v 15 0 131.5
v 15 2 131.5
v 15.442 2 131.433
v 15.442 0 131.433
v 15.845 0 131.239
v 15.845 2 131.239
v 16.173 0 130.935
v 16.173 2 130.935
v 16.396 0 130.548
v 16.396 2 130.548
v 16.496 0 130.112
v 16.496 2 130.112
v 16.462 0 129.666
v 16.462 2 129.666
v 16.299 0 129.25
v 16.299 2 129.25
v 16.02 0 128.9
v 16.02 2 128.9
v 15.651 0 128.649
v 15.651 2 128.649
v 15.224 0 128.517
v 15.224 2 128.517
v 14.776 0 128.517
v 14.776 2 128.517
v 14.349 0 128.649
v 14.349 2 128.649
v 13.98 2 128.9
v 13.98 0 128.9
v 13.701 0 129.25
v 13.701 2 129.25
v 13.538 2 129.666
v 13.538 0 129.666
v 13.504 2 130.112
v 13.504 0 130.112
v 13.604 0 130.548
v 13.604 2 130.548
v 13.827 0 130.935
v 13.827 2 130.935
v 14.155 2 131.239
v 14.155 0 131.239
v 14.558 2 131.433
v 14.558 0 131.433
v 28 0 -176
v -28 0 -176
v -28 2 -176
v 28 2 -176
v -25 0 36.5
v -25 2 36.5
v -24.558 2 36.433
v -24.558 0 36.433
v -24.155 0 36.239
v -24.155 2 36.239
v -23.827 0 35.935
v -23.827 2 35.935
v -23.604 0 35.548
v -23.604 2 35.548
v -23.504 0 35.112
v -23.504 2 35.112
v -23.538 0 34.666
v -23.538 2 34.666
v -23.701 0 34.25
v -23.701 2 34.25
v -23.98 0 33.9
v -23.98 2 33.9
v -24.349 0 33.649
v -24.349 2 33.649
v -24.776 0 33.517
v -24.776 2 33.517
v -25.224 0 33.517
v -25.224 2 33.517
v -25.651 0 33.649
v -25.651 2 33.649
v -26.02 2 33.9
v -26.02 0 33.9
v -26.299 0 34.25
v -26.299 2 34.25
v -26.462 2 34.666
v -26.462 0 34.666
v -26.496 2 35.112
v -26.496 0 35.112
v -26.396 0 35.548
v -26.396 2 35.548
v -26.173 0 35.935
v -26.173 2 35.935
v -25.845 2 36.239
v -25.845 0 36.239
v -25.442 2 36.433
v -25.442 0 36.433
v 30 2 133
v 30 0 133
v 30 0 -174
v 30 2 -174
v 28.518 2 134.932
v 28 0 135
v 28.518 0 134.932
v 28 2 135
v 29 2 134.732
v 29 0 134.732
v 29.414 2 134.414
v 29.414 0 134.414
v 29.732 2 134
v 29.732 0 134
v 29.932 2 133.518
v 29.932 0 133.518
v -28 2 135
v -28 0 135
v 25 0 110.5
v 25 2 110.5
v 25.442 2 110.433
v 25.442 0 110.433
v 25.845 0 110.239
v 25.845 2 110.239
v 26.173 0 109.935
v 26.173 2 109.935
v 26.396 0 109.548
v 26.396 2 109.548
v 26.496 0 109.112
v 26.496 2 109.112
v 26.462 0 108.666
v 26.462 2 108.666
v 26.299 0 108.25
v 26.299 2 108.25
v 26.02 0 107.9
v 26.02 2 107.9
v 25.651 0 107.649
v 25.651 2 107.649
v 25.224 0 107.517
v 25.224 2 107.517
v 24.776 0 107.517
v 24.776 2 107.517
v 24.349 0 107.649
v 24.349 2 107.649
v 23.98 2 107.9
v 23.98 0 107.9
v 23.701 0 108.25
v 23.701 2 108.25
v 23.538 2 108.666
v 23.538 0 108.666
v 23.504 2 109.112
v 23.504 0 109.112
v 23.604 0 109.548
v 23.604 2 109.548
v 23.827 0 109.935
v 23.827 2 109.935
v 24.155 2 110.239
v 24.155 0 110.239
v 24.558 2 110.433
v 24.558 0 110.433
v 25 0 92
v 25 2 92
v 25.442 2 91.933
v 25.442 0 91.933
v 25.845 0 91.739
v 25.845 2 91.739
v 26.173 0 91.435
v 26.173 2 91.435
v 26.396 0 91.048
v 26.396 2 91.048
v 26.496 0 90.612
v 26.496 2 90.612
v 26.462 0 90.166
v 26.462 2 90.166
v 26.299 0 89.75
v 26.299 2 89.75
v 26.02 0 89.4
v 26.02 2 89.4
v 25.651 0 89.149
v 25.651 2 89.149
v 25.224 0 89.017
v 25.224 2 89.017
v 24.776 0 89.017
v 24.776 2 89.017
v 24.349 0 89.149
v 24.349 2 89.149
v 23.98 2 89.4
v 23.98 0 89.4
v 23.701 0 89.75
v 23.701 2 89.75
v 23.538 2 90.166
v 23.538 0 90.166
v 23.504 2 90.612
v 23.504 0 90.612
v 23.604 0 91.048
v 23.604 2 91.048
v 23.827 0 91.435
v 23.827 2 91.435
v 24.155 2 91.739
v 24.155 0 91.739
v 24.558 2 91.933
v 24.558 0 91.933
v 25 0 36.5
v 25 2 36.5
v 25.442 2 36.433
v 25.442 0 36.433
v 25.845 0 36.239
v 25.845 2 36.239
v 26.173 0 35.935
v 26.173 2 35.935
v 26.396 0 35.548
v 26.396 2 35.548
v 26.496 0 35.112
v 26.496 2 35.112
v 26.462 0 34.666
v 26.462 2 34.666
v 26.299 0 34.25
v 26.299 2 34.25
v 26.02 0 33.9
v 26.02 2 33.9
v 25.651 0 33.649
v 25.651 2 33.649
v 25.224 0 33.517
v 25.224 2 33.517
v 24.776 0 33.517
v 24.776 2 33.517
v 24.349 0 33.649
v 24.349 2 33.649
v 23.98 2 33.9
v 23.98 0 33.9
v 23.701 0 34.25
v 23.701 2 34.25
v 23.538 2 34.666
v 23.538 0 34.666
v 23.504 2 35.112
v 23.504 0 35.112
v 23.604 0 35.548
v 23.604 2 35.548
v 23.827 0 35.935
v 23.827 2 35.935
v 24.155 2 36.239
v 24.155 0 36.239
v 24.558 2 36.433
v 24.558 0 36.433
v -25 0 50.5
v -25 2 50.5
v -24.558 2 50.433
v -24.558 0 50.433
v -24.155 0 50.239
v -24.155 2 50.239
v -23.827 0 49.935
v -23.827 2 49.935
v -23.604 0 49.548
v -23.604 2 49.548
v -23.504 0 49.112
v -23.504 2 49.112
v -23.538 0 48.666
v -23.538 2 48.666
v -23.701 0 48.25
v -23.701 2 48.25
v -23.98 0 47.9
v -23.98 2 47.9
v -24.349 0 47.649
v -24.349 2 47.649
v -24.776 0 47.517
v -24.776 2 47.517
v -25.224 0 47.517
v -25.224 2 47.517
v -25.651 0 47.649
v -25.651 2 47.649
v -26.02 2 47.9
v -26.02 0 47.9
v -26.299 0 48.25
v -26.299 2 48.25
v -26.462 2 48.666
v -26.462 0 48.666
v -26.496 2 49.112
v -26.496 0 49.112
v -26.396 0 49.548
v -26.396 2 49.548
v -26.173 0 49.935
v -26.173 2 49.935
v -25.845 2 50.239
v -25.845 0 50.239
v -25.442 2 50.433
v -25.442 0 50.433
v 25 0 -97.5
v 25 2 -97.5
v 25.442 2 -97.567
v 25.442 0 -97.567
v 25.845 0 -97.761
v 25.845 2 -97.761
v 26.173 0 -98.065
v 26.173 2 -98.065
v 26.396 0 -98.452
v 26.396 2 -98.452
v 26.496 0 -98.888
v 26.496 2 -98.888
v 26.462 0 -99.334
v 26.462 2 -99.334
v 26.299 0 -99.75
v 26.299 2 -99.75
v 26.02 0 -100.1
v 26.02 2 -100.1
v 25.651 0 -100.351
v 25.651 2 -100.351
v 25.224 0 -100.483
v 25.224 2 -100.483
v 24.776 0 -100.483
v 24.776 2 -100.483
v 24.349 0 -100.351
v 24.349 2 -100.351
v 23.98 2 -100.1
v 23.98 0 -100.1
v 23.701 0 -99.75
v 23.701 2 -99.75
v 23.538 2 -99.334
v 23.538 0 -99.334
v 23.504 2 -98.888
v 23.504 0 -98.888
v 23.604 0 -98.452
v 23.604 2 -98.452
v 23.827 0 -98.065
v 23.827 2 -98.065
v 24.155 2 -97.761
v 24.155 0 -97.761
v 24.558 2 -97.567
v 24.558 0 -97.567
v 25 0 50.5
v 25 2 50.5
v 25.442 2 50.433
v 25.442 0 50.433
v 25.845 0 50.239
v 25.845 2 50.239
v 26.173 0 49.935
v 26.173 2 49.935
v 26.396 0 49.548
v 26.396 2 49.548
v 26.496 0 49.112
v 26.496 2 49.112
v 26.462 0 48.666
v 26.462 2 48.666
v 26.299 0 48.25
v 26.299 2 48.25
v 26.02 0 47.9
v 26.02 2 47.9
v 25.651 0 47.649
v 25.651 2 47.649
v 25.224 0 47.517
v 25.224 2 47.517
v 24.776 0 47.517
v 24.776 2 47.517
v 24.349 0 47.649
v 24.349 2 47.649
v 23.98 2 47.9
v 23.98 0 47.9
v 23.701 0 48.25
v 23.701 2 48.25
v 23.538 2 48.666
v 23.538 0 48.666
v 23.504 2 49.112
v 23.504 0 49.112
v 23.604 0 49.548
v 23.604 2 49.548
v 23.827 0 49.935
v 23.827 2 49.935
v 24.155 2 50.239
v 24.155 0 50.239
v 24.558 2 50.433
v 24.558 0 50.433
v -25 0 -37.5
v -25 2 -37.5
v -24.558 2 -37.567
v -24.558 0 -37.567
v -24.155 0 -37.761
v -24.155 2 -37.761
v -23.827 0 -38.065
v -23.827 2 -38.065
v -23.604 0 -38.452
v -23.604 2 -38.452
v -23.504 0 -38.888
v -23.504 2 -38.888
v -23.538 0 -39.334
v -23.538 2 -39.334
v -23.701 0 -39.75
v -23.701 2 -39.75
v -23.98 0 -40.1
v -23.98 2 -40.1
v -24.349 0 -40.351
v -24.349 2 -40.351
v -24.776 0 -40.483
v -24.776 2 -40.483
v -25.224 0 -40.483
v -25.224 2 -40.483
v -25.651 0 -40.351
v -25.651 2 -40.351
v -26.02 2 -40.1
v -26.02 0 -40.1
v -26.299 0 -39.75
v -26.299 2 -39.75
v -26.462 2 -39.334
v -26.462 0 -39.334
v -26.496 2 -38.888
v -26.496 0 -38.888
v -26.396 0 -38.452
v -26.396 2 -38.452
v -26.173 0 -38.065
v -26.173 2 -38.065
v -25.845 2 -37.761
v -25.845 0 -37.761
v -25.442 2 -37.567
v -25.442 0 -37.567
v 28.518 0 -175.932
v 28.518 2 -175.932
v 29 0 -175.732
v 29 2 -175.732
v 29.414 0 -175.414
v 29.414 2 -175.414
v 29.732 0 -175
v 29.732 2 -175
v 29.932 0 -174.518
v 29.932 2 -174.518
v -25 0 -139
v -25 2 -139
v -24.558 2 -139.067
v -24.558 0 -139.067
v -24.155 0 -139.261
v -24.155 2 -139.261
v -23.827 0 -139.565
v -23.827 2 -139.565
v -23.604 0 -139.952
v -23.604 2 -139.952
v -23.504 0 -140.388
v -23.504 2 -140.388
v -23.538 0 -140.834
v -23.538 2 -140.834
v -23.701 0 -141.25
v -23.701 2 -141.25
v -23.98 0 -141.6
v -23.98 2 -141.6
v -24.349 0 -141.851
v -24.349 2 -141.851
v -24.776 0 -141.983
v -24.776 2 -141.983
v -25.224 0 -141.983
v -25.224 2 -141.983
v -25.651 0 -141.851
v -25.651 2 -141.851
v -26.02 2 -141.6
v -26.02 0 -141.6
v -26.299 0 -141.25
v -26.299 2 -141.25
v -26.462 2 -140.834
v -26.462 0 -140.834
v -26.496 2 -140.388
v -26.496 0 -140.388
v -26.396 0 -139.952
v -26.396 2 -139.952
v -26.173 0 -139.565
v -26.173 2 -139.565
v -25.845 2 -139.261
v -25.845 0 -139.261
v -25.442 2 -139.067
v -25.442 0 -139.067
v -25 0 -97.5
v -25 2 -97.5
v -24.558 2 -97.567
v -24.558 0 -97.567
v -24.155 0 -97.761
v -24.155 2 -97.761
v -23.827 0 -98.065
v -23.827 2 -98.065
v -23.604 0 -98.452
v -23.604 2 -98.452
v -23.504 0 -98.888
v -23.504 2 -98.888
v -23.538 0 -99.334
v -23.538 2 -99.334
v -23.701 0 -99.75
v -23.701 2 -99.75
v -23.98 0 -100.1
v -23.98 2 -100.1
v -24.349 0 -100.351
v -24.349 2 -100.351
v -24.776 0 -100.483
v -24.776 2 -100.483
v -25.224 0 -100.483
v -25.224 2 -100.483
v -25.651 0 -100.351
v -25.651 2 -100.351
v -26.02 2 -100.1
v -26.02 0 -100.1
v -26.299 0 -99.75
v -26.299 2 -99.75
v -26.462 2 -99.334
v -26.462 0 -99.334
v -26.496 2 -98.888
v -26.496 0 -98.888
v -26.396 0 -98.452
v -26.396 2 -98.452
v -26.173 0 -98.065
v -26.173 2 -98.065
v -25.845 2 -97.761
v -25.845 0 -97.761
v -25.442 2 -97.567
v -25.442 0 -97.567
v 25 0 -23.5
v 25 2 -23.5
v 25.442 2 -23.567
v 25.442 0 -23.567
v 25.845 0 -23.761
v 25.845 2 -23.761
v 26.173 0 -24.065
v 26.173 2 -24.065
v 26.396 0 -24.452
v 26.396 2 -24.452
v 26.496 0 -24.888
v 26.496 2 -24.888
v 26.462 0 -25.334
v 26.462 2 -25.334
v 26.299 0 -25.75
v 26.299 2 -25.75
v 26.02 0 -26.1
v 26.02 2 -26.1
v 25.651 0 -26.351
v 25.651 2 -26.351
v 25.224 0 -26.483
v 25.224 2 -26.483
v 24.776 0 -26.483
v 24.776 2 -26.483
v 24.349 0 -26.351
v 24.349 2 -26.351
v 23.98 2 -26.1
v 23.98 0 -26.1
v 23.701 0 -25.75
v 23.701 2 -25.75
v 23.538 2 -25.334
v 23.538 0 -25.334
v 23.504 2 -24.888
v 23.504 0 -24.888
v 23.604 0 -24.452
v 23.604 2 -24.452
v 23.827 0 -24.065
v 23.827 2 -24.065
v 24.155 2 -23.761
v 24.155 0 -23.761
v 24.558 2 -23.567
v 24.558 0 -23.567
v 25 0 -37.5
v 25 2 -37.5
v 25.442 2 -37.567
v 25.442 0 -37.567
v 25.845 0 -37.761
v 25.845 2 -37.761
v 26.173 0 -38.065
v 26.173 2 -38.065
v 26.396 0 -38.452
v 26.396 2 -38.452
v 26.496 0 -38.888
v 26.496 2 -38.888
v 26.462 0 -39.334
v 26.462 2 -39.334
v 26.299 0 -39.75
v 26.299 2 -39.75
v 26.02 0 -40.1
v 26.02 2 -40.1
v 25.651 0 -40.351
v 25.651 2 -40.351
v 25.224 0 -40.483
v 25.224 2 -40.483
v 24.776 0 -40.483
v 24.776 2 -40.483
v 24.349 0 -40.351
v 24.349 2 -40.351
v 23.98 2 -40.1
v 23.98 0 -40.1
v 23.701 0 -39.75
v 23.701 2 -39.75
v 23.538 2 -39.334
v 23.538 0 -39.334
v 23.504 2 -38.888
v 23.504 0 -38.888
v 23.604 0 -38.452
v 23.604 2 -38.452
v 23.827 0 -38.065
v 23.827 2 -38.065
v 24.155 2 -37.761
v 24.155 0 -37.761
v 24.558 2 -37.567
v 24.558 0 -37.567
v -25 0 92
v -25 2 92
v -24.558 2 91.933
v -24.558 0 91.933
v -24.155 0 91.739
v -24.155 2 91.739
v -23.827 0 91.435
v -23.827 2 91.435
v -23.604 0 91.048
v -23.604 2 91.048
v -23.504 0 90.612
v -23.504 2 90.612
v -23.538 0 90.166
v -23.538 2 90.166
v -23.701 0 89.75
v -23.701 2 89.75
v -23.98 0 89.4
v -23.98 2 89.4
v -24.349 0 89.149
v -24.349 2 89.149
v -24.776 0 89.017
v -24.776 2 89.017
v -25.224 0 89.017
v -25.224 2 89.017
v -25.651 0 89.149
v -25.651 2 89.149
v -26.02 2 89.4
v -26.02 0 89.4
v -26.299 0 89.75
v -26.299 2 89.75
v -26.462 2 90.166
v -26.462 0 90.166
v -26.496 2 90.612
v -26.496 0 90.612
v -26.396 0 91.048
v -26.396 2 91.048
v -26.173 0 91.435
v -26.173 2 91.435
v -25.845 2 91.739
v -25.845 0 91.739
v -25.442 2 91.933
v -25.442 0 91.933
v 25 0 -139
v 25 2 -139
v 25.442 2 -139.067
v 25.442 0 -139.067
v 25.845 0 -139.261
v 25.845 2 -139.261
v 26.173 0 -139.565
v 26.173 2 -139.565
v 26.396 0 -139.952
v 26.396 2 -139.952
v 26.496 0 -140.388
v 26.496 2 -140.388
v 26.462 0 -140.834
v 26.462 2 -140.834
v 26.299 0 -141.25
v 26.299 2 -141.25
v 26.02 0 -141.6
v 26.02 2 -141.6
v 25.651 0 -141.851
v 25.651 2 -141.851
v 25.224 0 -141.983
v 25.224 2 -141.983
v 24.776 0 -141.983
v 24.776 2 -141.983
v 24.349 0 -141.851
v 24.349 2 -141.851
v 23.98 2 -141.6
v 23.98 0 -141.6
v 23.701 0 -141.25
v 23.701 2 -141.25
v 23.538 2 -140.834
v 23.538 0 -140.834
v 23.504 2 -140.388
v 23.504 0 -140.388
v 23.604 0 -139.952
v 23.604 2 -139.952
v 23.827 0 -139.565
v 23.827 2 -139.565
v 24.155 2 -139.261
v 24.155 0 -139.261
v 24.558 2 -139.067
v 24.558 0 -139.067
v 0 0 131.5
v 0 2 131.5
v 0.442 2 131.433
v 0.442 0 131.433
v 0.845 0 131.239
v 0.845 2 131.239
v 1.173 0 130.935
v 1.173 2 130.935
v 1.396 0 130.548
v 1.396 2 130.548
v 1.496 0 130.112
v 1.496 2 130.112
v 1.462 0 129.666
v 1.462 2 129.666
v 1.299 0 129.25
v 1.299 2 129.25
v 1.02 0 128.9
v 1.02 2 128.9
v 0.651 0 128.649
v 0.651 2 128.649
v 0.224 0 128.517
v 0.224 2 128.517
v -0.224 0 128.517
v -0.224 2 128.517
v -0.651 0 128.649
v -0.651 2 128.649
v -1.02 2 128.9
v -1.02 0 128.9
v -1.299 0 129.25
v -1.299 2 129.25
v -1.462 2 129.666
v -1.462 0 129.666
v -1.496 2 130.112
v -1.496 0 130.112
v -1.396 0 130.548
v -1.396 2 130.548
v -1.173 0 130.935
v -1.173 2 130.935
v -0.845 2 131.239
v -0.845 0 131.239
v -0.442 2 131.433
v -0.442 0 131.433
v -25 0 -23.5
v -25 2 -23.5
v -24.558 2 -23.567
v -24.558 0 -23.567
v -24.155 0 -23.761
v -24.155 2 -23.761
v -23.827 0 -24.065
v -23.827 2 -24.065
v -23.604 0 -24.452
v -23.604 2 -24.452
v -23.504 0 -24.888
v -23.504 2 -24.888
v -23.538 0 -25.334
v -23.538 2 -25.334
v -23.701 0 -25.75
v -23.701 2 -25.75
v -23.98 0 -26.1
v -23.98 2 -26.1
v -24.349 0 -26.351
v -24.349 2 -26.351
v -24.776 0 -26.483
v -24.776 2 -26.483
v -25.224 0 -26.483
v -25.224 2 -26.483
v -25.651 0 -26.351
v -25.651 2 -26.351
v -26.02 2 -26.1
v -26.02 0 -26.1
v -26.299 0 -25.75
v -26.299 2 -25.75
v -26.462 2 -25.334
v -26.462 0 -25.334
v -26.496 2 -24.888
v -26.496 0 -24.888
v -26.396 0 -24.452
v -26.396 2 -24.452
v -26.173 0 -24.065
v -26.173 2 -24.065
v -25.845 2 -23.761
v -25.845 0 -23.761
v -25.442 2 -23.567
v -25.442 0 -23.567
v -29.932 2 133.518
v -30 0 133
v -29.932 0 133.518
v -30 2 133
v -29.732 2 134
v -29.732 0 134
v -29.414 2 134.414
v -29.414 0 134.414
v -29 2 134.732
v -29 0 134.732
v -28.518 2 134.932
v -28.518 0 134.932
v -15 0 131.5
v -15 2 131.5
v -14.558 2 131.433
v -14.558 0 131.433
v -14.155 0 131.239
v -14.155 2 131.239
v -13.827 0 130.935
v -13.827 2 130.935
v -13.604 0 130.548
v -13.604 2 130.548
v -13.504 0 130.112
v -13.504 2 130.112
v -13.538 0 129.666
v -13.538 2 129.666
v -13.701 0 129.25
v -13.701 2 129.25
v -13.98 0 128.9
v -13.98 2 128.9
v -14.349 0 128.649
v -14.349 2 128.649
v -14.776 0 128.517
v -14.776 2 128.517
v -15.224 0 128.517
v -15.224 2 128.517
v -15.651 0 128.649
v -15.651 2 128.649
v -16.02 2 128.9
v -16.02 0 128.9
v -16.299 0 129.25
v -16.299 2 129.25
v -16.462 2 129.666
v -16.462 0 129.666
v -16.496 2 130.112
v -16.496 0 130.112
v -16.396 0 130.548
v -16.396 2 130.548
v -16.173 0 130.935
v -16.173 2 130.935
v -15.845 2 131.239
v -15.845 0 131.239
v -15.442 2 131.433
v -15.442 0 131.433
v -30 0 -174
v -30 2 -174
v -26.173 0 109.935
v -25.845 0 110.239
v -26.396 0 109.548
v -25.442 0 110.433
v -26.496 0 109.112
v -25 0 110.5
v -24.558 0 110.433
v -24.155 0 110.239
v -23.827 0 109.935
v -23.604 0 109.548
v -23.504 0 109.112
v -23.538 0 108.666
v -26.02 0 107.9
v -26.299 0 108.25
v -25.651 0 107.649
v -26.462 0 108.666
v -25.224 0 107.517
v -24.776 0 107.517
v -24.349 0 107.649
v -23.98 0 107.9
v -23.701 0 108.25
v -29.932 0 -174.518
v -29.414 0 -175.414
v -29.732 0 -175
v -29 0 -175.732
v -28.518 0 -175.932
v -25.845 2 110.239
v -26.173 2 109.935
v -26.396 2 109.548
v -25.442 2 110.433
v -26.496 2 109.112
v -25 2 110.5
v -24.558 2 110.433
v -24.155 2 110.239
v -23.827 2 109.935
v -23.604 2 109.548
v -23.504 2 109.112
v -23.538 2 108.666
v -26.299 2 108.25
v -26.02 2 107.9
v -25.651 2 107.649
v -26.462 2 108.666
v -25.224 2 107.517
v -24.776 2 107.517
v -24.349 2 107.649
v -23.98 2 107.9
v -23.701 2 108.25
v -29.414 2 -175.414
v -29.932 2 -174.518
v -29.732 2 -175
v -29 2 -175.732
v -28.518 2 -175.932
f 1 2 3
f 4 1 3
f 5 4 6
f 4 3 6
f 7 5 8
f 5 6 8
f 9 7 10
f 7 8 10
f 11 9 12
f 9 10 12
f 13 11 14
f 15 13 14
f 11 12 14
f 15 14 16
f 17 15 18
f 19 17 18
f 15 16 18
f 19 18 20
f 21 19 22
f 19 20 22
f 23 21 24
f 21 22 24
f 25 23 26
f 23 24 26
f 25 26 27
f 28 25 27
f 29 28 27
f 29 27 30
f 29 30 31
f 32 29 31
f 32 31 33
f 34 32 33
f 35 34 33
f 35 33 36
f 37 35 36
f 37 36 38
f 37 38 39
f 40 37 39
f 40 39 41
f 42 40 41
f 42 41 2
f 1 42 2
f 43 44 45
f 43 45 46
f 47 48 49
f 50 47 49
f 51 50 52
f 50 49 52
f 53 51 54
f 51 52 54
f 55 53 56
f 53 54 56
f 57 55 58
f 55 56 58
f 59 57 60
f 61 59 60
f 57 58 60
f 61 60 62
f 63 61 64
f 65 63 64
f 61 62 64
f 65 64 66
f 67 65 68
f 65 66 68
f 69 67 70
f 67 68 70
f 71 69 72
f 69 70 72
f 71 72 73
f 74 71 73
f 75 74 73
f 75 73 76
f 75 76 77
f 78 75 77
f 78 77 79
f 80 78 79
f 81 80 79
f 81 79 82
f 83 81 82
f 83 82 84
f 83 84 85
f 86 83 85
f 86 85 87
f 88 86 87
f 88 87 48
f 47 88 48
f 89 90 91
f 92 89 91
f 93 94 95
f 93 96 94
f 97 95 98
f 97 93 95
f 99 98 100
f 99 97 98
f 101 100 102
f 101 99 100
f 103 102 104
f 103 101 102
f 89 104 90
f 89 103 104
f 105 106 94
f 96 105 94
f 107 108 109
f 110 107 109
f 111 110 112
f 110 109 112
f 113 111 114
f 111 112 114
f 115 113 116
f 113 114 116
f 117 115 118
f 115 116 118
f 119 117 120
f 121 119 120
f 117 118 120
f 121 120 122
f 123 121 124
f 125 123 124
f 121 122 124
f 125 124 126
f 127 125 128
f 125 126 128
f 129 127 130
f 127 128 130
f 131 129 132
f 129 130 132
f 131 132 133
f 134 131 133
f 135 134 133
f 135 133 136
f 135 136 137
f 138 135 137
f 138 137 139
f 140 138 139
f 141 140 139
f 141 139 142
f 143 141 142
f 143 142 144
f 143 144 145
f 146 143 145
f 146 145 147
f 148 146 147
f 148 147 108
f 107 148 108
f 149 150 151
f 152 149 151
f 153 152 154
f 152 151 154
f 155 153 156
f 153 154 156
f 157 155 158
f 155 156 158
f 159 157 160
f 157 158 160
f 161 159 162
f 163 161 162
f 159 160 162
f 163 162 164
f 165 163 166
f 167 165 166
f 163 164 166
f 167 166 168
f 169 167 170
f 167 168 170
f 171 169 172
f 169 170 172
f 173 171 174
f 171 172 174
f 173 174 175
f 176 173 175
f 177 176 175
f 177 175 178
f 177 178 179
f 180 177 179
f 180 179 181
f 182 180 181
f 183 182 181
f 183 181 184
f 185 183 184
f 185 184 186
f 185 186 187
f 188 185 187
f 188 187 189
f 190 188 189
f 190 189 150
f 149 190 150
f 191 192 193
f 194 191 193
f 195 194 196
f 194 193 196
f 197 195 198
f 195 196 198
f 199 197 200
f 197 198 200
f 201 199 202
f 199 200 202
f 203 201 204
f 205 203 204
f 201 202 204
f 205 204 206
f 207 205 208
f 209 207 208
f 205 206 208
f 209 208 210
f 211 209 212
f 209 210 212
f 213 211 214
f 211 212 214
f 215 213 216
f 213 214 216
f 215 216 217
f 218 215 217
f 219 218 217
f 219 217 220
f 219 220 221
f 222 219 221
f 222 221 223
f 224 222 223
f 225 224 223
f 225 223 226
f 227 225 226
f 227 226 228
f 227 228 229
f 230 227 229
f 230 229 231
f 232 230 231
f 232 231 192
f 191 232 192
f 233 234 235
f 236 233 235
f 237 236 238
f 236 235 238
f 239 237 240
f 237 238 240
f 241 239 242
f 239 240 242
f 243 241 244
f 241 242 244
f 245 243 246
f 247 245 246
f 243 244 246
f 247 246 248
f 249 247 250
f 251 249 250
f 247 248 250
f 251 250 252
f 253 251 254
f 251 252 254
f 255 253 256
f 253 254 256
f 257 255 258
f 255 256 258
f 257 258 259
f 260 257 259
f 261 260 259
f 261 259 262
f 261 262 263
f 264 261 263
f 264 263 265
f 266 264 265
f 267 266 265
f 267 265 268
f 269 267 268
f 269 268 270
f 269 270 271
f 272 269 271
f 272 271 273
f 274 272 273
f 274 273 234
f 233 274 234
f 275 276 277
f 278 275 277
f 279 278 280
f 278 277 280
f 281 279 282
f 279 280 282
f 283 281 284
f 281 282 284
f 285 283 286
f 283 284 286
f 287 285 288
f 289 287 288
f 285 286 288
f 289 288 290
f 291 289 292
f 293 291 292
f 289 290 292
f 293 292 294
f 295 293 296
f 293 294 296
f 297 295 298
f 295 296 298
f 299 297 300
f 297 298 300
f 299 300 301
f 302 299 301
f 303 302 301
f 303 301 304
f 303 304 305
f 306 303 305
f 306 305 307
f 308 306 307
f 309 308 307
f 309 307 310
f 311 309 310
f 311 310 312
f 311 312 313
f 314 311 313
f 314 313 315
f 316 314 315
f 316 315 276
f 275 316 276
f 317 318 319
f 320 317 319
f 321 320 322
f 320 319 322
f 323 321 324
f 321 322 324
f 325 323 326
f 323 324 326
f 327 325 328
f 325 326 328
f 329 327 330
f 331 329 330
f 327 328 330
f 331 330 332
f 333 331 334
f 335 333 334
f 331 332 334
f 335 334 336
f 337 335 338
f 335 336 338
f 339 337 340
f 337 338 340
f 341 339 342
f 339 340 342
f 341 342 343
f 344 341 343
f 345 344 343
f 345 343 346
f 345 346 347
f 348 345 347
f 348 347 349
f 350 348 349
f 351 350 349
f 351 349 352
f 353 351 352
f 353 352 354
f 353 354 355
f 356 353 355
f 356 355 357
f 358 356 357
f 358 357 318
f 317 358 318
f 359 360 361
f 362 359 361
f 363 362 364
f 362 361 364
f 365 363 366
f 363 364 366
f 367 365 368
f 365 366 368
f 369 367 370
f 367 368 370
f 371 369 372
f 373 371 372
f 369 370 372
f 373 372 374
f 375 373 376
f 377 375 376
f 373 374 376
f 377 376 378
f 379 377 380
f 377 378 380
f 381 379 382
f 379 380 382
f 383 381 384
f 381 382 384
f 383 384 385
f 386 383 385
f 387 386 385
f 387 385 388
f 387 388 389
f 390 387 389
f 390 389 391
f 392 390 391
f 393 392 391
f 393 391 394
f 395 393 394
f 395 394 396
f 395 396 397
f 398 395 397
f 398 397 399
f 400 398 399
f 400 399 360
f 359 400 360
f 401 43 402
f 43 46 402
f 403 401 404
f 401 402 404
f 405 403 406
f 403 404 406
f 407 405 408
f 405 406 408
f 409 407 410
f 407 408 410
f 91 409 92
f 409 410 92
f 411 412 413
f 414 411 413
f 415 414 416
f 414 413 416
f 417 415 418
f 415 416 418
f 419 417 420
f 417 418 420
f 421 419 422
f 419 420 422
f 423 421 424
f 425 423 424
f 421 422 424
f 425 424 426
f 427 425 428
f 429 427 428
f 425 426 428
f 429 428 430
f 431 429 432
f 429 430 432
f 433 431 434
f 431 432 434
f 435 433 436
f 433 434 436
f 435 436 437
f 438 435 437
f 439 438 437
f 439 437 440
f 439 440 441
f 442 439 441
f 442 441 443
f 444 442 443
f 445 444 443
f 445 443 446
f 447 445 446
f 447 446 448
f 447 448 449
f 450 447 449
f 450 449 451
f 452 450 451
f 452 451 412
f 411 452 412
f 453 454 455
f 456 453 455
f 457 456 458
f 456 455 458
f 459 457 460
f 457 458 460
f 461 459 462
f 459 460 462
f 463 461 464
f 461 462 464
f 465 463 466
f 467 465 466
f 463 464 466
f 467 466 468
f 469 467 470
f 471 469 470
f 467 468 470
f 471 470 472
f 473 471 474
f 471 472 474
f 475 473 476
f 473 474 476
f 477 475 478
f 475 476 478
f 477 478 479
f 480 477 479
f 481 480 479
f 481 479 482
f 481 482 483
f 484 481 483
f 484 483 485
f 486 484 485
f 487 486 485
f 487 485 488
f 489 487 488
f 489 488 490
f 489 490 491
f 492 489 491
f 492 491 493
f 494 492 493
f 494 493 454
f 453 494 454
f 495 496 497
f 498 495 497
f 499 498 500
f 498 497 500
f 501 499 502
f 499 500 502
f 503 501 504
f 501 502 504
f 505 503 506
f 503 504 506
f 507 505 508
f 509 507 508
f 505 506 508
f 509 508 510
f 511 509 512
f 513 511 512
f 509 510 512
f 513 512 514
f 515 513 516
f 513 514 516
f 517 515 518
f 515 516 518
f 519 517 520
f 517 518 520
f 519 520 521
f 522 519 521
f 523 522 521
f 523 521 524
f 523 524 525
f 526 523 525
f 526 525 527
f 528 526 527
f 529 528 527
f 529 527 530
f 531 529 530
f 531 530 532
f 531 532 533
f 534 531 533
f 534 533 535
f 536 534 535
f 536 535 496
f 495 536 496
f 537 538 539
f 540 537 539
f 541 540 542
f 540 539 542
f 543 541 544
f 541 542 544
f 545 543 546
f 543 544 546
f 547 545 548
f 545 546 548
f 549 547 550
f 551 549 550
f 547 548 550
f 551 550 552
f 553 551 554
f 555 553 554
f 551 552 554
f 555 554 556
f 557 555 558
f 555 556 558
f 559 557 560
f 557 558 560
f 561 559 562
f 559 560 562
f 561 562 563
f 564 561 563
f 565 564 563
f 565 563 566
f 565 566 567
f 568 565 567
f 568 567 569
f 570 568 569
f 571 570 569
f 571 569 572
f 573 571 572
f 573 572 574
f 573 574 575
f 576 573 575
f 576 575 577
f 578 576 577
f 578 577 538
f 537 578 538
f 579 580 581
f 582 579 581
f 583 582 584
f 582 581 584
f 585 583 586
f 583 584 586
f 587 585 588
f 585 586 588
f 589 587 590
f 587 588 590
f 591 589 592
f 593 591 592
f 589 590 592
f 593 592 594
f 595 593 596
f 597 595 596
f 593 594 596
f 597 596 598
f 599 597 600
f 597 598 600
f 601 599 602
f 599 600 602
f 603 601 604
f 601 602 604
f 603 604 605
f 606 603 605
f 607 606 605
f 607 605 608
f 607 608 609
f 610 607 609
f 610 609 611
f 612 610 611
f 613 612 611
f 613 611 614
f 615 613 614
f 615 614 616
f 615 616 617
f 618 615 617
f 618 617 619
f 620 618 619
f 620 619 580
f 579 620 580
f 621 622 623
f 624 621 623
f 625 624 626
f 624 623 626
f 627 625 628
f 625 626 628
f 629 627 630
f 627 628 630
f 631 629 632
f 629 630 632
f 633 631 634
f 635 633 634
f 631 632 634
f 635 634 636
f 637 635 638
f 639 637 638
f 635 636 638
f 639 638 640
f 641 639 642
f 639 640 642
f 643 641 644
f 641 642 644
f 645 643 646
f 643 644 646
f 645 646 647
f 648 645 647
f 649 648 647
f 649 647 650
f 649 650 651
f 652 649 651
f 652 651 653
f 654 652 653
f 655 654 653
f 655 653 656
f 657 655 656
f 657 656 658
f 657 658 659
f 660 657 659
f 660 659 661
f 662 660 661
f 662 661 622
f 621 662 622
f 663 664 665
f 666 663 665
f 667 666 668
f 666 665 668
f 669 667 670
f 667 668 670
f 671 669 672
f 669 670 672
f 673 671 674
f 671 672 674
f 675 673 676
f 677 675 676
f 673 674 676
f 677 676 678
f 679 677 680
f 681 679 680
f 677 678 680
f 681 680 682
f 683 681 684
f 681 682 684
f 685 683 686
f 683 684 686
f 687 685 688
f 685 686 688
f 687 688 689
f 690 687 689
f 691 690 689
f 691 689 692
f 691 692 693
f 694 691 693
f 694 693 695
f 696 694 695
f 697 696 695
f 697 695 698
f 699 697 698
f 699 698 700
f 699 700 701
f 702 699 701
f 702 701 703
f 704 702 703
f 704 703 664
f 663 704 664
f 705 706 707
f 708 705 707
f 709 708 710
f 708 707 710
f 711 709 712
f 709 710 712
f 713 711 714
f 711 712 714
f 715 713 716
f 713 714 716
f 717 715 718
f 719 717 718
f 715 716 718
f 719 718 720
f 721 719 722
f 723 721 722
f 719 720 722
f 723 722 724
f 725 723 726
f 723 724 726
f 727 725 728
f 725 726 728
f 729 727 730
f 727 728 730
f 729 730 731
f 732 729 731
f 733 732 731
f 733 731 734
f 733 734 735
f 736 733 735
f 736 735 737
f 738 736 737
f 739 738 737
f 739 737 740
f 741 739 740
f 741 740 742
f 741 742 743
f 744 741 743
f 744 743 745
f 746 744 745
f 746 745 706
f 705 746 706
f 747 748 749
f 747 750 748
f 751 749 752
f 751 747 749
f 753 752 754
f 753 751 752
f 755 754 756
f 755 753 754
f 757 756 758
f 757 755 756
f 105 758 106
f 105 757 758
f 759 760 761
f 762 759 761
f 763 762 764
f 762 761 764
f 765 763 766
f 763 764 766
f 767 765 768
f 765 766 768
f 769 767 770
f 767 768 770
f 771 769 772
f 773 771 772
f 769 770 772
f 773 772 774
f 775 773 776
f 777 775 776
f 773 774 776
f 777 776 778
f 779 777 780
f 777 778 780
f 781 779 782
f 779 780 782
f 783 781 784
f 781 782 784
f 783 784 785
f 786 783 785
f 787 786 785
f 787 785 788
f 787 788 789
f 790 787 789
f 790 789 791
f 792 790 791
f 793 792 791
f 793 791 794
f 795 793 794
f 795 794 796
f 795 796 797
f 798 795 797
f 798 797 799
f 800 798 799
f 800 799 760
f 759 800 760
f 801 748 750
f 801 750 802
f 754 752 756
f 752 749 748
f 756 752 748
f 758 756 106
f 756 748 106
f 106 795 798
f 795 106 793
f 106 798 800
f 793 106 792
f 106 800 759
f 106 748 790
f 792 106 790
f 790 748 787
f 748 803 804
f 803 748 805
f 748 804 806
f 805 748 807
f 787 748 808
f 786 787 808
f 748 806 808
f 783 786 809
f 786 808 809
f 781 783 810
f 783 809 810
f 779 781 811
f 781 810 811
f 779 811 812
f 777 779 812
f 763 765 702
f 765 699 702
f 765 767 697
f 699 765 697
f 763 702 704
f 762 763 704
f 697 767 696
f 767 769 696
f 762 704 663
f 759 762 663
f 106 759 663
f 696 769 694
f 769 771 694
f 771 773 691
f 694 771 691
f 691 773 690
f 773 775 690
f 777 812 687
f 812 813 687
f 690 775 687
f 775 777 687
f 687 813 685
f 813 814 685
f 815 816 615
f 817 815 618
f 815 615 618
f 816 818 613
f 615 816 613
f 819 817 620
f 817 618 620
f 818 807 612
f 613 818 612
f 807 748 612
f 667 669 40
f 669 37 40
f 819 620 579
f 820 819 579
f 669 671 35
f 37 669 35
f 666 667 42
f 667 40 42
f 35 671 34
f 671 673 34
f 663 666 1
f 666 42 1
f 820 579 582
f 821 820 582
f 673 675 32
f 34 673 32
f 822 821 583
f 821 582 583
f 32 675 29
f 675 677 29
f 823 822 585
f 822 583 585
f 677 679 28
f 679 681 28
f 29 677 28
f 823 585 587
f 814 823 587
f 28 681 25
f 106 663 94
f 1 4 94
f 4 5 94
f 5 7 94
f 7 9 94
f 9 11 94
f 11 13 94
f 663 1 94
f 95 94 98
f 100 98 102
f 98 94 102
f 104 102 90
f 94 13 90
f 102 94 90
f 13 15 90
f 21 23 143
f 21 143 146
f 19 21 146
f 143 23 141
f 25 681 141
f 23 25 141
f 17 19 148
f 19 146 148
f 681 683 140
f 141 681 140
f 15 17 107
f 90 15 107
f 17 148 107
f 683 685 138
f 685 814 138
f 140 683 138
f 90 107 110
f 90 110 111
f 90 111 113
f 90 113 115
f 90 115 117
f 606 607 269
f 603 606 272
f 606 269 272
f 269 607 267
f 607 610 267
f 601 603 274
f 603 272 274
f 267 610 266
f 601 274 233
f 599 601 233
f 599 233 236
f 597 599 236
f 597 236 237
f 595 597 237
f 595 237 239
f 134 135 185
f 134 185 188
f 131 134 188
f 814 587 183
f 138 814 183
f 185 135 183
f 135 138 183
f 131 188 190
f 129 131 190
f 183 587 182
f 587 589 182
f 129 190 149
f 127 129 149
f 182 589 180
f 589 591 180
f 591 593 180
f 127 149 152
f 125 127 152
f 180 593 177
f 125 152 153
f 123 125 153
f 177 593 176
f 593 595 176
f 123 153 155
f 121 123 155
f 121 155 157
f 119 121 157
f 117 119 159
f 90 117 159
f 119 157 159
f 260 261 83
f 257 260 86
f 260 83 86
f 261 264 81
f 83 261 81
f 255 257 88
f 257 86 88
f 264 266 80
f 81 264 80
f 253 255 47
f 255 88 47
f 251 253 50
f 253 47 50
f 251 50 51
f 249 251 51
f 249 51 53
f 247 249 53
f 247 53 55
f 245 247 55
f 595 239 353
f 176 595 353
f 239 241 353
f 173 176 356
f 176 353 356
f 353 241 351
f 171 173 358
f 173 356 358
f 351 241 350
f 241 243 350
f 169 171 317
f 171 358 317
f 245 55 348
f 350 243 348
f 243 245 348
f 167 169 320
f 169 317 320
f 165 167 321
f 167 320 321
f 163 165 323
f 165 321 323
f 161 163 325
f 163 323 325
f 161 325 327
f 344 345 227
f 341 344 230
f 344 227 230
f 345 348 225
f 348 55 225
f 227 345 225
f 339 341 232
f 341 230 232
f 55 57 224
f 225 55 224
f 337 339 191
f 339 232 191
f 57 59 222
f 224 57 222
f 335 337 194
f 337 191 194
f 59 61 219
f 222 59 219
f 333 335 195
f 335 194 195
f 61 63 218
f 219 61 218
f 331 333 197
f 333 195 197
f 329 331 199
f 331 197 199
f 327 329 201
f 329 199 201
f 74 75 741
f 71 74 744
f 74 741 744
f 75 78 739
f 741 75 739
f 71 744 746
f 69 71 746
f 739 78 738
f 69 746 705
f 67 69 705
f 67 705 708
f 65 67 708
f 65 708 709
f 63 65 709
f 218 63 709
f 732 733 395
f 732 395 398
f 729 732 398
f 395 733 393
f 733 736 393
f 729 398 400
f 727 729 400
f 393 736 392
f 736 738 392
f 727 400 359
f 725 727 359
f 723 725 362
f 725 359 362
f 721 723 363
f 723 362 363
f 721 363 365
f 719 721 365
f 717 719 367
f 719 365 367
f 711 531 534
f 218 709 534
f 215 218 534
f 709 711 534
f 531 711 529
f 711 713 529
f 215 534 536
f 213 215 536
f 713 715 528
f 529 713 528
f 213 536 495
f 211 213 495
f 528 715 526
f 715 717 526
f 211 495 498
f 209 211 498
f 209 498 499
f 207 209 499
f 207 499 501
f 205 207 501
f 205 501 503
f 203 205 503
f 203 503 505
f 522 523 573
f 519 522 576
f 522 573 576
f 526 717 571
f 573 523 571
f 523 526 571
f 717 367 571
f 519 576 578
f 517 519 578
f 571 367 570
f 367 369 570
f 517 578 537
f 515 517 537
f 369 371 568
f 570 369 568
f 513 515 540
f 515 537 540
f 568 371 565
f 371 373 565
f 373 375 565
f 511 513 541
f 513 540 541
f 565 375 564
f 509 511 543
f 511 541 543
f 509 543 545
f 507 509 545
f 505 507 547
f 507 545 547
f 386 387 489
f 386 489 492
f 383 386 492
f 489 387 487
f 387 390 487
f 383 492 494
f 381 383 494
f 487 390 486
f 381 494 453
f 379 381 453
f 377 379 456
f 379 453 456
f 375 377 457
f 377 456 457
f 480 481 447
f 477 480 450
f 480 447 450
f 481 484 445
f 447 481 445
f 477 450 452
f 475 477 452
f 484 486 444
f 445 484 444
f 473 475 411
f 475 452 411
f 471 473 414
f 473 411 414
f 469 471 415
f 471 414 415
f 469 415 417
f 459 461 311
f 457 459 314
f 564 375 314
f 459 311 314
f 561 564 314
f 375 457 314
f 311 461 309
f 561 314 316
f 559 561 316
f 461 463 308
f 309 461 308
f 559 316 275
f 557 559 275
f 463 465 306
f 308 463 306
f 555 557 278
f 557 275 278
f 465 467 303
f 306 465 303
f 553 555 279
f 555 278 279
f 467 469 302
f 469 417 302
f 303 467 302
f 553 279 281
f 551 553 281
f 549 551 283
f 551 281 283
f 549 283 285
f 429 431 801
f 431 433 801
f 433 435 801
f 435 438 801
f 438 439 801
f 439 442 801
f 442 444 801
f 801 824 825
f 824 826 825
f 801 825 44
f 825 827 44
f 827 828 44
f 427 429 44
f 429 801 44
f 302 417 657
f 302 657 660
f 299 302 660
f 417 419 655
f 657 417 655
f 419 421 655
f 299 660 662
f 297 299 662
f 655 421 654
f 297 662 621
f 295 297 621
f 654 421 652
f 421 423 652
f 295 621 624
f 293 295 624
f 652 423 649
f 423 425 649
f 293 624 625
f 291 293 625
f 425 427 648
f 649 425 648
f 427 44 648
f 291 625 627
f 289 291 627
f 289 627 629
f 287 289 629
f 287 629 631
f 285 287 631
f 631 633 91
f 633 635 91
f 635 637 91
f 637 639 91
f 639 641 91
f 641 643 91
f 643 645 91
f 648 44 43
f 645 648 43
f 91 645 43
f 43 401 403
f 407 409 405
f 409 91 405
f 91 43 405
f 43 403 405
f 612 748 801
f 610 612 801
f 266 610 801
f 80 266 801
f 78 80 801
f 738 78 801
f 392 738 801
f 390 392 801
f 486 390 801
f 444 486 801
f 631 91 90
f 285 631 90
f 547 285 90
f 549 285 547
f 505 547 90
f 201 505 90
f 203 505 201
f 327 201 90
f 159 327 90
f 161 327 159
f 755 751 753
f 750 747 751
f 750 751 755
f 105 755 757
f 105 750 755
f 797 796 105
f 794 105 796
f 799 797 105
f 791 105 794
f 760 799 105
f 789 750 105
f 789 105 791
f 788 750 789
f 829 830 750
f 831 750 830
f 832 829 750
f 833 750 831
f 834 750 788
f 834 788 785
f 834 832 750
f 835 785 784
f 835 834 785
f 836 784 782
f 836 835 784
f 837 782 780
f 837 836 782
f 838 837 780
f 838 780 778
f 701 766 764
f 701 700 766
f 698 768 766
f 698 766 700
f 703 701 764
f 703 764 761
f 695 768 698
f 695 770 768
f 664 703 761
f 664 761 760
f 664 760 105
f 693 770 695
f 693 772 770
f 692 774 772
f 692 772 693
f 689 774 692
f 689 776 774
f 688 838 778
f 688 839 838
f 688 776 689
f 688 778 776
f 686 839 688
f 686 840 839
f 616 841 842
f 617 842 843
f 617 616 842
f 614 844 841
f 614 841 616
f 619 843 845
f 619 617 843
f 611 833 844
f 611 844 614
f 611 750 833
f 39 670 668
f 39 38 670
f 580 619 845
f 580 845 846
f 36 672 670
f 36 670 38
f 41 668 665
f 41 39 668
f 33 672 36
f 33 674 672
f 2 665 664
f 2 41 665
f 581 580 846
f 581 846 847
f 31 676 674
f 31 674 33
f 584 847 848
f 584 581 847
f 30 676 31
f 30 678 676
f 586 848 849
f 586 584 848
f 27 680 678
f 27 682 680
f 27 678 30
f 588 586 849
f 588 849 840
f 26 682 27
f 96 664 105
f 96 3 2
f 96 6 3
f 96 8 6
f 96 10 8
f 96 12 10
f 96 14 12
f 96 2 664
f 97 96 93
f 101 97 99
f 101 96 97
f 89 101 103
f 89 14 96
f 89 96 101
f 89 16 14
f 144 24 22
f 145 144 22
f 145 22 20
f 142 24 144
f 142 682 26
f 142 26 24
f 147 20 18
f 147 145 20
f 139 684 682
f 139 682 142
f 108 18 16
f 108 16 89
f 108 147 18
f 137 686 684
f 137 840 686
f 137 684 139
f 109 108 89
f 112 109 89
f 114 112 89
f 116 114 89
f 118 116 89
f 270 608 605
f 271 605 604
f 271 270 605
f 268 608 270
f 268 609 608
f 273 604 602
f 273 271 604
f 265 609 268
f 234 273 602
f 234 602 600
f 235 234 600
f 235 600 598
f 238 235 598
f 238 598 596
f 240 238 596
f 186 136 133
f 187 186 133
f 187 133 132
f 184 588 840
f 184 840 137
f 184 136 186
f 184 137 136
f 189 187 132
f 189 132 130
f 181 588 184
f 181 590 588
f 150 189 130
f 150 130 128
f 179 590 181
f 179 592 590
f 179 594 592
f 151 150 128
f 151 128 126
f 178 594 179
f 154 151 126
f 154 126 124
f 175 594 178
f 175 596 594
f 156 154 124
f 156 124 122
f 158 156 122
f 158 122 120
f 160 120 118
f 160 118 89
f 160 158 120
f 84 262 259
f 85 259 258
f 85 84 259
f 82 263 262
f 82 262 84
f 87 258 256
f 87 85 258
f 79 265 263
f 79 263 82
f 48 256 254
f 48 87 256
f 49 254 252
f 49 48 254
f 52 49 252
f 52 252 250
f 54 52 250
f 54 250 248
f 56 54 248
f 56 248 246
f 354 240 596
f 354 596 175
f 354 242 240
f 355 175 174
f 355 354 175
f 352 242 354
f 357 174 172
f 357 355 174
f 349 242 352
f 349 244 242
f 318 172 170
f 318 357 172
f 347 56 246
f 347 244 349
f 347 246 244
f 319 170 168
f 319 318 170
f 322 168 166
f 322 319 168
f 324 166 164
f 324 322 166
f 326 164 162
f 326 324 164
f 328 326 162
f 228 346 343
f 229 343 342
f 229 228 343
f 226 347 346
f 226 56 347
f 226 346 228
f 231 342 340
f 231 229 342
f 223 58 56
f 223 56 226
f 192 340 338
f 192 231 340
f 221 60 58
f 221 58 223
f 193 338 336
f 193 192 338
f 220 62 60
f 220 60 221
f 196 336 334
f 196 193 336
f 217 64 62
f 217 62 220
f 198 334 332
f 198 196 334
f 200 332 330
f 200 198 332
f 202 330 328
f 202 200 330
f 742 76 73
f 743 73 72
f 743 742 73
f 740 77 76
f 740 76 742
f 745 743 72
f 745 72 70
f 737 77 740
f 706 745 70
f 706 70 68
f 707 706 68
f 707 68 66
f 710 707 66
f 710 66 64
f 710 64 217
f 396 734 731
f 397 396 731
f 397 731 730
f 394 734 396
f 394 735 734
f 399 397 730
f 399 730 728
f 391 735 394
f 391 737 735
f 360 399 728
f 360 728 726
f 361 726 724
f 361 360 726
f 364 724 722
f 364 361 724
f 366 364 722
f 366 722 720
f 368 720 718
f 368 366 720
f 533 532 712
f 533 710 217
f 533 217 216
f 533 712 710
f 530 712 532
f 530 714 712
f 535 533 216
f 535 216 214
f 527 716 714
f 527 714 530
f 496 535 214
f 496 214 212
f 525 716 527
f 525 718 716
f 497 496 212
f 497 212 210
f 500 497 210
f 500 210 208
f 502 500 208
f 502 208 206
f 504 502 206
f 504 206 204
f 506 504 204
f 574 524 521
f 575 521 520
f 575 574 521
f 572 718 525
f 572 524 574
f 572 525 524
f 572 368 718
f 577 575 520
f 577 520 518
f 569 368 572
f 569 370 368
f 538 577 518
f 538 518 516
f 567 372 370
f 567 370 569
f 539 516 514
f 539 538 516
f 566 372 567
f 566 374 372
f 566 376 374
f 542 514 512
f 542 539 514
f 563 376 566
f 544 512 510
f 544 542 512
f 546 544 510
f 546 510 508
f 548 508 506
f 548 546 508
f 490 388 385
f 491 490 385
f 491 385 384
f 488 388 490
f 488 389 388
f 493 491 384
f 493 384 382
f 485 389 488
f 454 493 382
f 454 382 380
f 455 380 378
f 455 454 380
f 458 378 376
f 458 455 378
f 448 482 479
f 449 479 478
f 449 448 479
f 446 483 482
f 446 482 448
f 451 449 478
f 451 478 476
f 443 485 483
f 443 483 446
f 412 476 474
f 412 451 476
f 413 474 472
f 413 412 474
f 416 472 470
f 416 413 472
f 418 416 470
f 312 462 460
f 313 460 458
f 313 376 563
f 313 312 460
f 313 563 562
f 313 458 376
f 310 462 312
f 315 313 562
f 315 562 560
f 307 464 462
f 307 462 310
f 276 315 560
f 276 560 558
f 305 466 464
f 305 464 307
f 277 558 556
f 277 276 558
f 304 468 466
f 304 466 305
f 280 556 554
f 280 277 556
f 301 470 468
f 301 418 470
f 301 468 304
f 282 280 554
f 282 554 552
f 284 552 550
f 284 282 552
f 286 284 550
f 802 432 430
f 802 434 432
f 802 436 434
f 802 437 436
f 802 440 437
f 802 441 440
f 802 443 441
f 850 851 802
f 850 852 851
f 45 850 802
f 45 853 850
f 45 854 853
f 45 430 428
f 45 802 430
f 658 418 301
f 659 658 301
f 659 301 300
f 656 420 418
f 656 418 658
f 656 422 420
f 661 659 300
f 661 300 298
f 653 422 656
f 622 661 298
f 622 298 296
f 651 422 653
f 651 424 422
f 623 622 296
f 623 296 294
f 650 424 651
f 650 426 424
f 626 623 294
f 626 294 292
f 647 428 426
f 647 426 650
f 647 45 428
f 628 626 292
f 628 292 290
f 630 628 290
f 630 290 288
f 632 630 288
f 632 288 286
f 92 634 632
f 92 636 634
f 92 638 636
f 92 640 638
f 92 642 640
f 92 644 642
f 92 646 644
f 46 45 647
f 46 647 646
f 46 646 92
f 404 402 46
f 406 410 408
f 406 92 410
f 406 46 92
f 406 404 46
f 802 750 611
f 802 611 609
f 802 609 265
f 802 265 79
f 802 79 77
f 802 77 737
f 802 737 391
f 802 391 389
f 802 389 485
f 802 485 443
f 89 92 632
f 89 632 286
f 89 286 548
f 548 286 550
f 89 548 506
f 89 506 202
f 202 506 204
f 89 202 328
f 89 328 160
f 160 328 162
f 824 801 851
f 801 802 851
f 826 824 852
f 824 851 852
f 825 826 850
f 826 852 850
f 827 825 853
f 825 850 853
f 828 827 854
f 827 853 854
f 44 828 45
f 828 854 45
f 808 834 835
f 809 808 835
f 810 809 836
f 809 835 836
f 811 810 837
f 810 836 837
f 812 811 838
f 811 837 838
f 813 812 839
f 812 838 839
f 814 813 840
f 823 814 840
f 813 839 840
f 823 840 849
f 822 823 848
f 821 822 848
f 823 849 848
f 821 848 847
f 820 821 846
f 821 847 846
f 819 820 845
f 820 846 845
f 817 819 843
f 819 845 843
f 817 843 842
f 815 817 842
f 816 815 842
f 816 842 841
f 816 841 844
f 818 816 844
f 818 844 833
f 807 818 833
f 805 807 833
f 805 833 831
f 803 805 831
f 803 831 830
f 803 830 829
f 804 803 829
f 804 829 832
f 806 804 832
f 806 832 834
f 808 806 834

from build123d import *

# Parameters (mm, degrees)
SKETCH_1_W             = 60
SKETCH_1_H             = 311
EXTRUDE_892_DEPTH      = 2
SKETCH_5_R             = 1.5
CUT_EXTRUDE_1272_DEPTH = 179.549712965
SKETCH_3_R             = 1.5
CUT_EXTRUDE_1780_DEPTH = 179.549712965
SKETCH_8_R             = 1.5
CUT_EXTRUDE_2158_DEPTH = 179.549712965
FILLET_1_R             = 2


with BuildPart() as part:
    # эскиз 1 → Extrude 892 (new body)
    with BuildSketch(Plane(origin=(0, 0, 0), x_dir=(1, 0, 0), z_dir=(0, 1, 0))):
        with Locations((0, 20.5)):
            Rectangle(SKETCH_1_W, SKETCH_1_H)
    extrude(amount=EXTRUDE_892_DEPTH)

    # Эскиз5 → Cut-Extrude 1272 (cut, through all)
    with BuildSketch(Plane(origin=(0, 2, 0), x_dir=(1, 0, 0), z_dir=(0, 1, 0))):
        with Locations(Location((-25, 99, 0), (0, 0, 270))):
            Circle(SKETCH_5_R)
        with Locations(Location((25, 99, 0), (0, 0, 270))):
            Circle(SKETCH_5_R)
        with Locations(Location((25, 39, 0), (0, 0, 270))):
            Circle(SKETCH_5_R)
        with Locations(Location((-25, 39, 0), (0, 0, 270))):
            Circle(SKETCH_5_R)
        with Locations(Location((-25, 25, 0), (0, 0, 270))):
            Circle(SKETCH_5_R)
        with Locations(Location((25, 25, 0), (0, 0, 270))):
            Circle(SKETCH_5_R)
        with Locations(Location((-25, -35, 0), (0, 0, 270))):
            Circle(SKETCH_5_R)
        with Locations(Location((25, -35, 0), (0, 0, 270))):
            Circle(SKETCH_5_R)
        with Locations(Location((25, -49, 0), (0, 0, 270))):
            Circle(SKETCH_5_R)
        with Locations(Location((-25, -49, 0), (0, 0, 270))):
            Circle(SKETCH_5_R)
        with Locations(Location((25, -109, 0), (0, 0, 270))):
            Circle(SKETCH_5_R)
        with Locations(Location((-25, -109, 0), (0, 0, 270))):
            Circle(SKETCH_5_R)
    extrude(amount=-CUT_EXTRUDE_1272_DEPTH, mode=Mode.SUBTRACT)

    # эскиз 3 → Cut-Extrude 1780 (cut, through all)
    with BuildSketch(Plane(origin=(0, 2, 0), x_dir=(1, 0, 0), z_dir=(0, 1, 0))):
        with Locations(Location((-25, -90.5, 0), (0, 0, 270))):
            Circle(SKETCH_3_R)
        with Locations(Location((25, -90.5, 0), (0, 0, 270))):
            Circle(SKETCH_3_R)
        with Locations(Location((-25, 140.5, 0), (0, 0, 270))):
            Circle(SKETCH_3_R)
        with Locations(Location((25, 140.5, 0), (0, 0, 270))):
            Circle(SKETCH_3_R)
    extrude(amount=-CUT_EXTRUDE_1780_DEPTH, mode=Mode.SUBTRACT)

    # Эскиз8 → Cut-Extrude 2158 (cut, through all)
    with BuildSketch(Plane(origin=(0, 2, 0), x_dir=(1, 0, 0), z_dir=(0, 1, 0))):
        with Locations(Location((-15, -130, 0), (0, 0, 270))):
            Circle(SKETCH_8_R)
        with Locations(Location((15, -130, 0), (0, 0, 270))):
            Circle(SKETCH_8_R)
        with Locations(Location((0, -130, 0), (0, 0, 270))):
            Circle(SKETCH_8_R)
    extrude(amount=-CUT_EXTRUDE_2158_DEPTH, mode=Mode.SUBTRACT)

    # Скругление1
    fillet_1_edges = [part.edges().sort_by_distance(p)[0] for p in [
        (-30, 1, -176),
        (30, 1, -176),
        (30, 1, 135),
        (-30, 1, 135),
    ]]
    fillet(fillet_1_edges, radius=FILLET_1_R)


solid = part.part
